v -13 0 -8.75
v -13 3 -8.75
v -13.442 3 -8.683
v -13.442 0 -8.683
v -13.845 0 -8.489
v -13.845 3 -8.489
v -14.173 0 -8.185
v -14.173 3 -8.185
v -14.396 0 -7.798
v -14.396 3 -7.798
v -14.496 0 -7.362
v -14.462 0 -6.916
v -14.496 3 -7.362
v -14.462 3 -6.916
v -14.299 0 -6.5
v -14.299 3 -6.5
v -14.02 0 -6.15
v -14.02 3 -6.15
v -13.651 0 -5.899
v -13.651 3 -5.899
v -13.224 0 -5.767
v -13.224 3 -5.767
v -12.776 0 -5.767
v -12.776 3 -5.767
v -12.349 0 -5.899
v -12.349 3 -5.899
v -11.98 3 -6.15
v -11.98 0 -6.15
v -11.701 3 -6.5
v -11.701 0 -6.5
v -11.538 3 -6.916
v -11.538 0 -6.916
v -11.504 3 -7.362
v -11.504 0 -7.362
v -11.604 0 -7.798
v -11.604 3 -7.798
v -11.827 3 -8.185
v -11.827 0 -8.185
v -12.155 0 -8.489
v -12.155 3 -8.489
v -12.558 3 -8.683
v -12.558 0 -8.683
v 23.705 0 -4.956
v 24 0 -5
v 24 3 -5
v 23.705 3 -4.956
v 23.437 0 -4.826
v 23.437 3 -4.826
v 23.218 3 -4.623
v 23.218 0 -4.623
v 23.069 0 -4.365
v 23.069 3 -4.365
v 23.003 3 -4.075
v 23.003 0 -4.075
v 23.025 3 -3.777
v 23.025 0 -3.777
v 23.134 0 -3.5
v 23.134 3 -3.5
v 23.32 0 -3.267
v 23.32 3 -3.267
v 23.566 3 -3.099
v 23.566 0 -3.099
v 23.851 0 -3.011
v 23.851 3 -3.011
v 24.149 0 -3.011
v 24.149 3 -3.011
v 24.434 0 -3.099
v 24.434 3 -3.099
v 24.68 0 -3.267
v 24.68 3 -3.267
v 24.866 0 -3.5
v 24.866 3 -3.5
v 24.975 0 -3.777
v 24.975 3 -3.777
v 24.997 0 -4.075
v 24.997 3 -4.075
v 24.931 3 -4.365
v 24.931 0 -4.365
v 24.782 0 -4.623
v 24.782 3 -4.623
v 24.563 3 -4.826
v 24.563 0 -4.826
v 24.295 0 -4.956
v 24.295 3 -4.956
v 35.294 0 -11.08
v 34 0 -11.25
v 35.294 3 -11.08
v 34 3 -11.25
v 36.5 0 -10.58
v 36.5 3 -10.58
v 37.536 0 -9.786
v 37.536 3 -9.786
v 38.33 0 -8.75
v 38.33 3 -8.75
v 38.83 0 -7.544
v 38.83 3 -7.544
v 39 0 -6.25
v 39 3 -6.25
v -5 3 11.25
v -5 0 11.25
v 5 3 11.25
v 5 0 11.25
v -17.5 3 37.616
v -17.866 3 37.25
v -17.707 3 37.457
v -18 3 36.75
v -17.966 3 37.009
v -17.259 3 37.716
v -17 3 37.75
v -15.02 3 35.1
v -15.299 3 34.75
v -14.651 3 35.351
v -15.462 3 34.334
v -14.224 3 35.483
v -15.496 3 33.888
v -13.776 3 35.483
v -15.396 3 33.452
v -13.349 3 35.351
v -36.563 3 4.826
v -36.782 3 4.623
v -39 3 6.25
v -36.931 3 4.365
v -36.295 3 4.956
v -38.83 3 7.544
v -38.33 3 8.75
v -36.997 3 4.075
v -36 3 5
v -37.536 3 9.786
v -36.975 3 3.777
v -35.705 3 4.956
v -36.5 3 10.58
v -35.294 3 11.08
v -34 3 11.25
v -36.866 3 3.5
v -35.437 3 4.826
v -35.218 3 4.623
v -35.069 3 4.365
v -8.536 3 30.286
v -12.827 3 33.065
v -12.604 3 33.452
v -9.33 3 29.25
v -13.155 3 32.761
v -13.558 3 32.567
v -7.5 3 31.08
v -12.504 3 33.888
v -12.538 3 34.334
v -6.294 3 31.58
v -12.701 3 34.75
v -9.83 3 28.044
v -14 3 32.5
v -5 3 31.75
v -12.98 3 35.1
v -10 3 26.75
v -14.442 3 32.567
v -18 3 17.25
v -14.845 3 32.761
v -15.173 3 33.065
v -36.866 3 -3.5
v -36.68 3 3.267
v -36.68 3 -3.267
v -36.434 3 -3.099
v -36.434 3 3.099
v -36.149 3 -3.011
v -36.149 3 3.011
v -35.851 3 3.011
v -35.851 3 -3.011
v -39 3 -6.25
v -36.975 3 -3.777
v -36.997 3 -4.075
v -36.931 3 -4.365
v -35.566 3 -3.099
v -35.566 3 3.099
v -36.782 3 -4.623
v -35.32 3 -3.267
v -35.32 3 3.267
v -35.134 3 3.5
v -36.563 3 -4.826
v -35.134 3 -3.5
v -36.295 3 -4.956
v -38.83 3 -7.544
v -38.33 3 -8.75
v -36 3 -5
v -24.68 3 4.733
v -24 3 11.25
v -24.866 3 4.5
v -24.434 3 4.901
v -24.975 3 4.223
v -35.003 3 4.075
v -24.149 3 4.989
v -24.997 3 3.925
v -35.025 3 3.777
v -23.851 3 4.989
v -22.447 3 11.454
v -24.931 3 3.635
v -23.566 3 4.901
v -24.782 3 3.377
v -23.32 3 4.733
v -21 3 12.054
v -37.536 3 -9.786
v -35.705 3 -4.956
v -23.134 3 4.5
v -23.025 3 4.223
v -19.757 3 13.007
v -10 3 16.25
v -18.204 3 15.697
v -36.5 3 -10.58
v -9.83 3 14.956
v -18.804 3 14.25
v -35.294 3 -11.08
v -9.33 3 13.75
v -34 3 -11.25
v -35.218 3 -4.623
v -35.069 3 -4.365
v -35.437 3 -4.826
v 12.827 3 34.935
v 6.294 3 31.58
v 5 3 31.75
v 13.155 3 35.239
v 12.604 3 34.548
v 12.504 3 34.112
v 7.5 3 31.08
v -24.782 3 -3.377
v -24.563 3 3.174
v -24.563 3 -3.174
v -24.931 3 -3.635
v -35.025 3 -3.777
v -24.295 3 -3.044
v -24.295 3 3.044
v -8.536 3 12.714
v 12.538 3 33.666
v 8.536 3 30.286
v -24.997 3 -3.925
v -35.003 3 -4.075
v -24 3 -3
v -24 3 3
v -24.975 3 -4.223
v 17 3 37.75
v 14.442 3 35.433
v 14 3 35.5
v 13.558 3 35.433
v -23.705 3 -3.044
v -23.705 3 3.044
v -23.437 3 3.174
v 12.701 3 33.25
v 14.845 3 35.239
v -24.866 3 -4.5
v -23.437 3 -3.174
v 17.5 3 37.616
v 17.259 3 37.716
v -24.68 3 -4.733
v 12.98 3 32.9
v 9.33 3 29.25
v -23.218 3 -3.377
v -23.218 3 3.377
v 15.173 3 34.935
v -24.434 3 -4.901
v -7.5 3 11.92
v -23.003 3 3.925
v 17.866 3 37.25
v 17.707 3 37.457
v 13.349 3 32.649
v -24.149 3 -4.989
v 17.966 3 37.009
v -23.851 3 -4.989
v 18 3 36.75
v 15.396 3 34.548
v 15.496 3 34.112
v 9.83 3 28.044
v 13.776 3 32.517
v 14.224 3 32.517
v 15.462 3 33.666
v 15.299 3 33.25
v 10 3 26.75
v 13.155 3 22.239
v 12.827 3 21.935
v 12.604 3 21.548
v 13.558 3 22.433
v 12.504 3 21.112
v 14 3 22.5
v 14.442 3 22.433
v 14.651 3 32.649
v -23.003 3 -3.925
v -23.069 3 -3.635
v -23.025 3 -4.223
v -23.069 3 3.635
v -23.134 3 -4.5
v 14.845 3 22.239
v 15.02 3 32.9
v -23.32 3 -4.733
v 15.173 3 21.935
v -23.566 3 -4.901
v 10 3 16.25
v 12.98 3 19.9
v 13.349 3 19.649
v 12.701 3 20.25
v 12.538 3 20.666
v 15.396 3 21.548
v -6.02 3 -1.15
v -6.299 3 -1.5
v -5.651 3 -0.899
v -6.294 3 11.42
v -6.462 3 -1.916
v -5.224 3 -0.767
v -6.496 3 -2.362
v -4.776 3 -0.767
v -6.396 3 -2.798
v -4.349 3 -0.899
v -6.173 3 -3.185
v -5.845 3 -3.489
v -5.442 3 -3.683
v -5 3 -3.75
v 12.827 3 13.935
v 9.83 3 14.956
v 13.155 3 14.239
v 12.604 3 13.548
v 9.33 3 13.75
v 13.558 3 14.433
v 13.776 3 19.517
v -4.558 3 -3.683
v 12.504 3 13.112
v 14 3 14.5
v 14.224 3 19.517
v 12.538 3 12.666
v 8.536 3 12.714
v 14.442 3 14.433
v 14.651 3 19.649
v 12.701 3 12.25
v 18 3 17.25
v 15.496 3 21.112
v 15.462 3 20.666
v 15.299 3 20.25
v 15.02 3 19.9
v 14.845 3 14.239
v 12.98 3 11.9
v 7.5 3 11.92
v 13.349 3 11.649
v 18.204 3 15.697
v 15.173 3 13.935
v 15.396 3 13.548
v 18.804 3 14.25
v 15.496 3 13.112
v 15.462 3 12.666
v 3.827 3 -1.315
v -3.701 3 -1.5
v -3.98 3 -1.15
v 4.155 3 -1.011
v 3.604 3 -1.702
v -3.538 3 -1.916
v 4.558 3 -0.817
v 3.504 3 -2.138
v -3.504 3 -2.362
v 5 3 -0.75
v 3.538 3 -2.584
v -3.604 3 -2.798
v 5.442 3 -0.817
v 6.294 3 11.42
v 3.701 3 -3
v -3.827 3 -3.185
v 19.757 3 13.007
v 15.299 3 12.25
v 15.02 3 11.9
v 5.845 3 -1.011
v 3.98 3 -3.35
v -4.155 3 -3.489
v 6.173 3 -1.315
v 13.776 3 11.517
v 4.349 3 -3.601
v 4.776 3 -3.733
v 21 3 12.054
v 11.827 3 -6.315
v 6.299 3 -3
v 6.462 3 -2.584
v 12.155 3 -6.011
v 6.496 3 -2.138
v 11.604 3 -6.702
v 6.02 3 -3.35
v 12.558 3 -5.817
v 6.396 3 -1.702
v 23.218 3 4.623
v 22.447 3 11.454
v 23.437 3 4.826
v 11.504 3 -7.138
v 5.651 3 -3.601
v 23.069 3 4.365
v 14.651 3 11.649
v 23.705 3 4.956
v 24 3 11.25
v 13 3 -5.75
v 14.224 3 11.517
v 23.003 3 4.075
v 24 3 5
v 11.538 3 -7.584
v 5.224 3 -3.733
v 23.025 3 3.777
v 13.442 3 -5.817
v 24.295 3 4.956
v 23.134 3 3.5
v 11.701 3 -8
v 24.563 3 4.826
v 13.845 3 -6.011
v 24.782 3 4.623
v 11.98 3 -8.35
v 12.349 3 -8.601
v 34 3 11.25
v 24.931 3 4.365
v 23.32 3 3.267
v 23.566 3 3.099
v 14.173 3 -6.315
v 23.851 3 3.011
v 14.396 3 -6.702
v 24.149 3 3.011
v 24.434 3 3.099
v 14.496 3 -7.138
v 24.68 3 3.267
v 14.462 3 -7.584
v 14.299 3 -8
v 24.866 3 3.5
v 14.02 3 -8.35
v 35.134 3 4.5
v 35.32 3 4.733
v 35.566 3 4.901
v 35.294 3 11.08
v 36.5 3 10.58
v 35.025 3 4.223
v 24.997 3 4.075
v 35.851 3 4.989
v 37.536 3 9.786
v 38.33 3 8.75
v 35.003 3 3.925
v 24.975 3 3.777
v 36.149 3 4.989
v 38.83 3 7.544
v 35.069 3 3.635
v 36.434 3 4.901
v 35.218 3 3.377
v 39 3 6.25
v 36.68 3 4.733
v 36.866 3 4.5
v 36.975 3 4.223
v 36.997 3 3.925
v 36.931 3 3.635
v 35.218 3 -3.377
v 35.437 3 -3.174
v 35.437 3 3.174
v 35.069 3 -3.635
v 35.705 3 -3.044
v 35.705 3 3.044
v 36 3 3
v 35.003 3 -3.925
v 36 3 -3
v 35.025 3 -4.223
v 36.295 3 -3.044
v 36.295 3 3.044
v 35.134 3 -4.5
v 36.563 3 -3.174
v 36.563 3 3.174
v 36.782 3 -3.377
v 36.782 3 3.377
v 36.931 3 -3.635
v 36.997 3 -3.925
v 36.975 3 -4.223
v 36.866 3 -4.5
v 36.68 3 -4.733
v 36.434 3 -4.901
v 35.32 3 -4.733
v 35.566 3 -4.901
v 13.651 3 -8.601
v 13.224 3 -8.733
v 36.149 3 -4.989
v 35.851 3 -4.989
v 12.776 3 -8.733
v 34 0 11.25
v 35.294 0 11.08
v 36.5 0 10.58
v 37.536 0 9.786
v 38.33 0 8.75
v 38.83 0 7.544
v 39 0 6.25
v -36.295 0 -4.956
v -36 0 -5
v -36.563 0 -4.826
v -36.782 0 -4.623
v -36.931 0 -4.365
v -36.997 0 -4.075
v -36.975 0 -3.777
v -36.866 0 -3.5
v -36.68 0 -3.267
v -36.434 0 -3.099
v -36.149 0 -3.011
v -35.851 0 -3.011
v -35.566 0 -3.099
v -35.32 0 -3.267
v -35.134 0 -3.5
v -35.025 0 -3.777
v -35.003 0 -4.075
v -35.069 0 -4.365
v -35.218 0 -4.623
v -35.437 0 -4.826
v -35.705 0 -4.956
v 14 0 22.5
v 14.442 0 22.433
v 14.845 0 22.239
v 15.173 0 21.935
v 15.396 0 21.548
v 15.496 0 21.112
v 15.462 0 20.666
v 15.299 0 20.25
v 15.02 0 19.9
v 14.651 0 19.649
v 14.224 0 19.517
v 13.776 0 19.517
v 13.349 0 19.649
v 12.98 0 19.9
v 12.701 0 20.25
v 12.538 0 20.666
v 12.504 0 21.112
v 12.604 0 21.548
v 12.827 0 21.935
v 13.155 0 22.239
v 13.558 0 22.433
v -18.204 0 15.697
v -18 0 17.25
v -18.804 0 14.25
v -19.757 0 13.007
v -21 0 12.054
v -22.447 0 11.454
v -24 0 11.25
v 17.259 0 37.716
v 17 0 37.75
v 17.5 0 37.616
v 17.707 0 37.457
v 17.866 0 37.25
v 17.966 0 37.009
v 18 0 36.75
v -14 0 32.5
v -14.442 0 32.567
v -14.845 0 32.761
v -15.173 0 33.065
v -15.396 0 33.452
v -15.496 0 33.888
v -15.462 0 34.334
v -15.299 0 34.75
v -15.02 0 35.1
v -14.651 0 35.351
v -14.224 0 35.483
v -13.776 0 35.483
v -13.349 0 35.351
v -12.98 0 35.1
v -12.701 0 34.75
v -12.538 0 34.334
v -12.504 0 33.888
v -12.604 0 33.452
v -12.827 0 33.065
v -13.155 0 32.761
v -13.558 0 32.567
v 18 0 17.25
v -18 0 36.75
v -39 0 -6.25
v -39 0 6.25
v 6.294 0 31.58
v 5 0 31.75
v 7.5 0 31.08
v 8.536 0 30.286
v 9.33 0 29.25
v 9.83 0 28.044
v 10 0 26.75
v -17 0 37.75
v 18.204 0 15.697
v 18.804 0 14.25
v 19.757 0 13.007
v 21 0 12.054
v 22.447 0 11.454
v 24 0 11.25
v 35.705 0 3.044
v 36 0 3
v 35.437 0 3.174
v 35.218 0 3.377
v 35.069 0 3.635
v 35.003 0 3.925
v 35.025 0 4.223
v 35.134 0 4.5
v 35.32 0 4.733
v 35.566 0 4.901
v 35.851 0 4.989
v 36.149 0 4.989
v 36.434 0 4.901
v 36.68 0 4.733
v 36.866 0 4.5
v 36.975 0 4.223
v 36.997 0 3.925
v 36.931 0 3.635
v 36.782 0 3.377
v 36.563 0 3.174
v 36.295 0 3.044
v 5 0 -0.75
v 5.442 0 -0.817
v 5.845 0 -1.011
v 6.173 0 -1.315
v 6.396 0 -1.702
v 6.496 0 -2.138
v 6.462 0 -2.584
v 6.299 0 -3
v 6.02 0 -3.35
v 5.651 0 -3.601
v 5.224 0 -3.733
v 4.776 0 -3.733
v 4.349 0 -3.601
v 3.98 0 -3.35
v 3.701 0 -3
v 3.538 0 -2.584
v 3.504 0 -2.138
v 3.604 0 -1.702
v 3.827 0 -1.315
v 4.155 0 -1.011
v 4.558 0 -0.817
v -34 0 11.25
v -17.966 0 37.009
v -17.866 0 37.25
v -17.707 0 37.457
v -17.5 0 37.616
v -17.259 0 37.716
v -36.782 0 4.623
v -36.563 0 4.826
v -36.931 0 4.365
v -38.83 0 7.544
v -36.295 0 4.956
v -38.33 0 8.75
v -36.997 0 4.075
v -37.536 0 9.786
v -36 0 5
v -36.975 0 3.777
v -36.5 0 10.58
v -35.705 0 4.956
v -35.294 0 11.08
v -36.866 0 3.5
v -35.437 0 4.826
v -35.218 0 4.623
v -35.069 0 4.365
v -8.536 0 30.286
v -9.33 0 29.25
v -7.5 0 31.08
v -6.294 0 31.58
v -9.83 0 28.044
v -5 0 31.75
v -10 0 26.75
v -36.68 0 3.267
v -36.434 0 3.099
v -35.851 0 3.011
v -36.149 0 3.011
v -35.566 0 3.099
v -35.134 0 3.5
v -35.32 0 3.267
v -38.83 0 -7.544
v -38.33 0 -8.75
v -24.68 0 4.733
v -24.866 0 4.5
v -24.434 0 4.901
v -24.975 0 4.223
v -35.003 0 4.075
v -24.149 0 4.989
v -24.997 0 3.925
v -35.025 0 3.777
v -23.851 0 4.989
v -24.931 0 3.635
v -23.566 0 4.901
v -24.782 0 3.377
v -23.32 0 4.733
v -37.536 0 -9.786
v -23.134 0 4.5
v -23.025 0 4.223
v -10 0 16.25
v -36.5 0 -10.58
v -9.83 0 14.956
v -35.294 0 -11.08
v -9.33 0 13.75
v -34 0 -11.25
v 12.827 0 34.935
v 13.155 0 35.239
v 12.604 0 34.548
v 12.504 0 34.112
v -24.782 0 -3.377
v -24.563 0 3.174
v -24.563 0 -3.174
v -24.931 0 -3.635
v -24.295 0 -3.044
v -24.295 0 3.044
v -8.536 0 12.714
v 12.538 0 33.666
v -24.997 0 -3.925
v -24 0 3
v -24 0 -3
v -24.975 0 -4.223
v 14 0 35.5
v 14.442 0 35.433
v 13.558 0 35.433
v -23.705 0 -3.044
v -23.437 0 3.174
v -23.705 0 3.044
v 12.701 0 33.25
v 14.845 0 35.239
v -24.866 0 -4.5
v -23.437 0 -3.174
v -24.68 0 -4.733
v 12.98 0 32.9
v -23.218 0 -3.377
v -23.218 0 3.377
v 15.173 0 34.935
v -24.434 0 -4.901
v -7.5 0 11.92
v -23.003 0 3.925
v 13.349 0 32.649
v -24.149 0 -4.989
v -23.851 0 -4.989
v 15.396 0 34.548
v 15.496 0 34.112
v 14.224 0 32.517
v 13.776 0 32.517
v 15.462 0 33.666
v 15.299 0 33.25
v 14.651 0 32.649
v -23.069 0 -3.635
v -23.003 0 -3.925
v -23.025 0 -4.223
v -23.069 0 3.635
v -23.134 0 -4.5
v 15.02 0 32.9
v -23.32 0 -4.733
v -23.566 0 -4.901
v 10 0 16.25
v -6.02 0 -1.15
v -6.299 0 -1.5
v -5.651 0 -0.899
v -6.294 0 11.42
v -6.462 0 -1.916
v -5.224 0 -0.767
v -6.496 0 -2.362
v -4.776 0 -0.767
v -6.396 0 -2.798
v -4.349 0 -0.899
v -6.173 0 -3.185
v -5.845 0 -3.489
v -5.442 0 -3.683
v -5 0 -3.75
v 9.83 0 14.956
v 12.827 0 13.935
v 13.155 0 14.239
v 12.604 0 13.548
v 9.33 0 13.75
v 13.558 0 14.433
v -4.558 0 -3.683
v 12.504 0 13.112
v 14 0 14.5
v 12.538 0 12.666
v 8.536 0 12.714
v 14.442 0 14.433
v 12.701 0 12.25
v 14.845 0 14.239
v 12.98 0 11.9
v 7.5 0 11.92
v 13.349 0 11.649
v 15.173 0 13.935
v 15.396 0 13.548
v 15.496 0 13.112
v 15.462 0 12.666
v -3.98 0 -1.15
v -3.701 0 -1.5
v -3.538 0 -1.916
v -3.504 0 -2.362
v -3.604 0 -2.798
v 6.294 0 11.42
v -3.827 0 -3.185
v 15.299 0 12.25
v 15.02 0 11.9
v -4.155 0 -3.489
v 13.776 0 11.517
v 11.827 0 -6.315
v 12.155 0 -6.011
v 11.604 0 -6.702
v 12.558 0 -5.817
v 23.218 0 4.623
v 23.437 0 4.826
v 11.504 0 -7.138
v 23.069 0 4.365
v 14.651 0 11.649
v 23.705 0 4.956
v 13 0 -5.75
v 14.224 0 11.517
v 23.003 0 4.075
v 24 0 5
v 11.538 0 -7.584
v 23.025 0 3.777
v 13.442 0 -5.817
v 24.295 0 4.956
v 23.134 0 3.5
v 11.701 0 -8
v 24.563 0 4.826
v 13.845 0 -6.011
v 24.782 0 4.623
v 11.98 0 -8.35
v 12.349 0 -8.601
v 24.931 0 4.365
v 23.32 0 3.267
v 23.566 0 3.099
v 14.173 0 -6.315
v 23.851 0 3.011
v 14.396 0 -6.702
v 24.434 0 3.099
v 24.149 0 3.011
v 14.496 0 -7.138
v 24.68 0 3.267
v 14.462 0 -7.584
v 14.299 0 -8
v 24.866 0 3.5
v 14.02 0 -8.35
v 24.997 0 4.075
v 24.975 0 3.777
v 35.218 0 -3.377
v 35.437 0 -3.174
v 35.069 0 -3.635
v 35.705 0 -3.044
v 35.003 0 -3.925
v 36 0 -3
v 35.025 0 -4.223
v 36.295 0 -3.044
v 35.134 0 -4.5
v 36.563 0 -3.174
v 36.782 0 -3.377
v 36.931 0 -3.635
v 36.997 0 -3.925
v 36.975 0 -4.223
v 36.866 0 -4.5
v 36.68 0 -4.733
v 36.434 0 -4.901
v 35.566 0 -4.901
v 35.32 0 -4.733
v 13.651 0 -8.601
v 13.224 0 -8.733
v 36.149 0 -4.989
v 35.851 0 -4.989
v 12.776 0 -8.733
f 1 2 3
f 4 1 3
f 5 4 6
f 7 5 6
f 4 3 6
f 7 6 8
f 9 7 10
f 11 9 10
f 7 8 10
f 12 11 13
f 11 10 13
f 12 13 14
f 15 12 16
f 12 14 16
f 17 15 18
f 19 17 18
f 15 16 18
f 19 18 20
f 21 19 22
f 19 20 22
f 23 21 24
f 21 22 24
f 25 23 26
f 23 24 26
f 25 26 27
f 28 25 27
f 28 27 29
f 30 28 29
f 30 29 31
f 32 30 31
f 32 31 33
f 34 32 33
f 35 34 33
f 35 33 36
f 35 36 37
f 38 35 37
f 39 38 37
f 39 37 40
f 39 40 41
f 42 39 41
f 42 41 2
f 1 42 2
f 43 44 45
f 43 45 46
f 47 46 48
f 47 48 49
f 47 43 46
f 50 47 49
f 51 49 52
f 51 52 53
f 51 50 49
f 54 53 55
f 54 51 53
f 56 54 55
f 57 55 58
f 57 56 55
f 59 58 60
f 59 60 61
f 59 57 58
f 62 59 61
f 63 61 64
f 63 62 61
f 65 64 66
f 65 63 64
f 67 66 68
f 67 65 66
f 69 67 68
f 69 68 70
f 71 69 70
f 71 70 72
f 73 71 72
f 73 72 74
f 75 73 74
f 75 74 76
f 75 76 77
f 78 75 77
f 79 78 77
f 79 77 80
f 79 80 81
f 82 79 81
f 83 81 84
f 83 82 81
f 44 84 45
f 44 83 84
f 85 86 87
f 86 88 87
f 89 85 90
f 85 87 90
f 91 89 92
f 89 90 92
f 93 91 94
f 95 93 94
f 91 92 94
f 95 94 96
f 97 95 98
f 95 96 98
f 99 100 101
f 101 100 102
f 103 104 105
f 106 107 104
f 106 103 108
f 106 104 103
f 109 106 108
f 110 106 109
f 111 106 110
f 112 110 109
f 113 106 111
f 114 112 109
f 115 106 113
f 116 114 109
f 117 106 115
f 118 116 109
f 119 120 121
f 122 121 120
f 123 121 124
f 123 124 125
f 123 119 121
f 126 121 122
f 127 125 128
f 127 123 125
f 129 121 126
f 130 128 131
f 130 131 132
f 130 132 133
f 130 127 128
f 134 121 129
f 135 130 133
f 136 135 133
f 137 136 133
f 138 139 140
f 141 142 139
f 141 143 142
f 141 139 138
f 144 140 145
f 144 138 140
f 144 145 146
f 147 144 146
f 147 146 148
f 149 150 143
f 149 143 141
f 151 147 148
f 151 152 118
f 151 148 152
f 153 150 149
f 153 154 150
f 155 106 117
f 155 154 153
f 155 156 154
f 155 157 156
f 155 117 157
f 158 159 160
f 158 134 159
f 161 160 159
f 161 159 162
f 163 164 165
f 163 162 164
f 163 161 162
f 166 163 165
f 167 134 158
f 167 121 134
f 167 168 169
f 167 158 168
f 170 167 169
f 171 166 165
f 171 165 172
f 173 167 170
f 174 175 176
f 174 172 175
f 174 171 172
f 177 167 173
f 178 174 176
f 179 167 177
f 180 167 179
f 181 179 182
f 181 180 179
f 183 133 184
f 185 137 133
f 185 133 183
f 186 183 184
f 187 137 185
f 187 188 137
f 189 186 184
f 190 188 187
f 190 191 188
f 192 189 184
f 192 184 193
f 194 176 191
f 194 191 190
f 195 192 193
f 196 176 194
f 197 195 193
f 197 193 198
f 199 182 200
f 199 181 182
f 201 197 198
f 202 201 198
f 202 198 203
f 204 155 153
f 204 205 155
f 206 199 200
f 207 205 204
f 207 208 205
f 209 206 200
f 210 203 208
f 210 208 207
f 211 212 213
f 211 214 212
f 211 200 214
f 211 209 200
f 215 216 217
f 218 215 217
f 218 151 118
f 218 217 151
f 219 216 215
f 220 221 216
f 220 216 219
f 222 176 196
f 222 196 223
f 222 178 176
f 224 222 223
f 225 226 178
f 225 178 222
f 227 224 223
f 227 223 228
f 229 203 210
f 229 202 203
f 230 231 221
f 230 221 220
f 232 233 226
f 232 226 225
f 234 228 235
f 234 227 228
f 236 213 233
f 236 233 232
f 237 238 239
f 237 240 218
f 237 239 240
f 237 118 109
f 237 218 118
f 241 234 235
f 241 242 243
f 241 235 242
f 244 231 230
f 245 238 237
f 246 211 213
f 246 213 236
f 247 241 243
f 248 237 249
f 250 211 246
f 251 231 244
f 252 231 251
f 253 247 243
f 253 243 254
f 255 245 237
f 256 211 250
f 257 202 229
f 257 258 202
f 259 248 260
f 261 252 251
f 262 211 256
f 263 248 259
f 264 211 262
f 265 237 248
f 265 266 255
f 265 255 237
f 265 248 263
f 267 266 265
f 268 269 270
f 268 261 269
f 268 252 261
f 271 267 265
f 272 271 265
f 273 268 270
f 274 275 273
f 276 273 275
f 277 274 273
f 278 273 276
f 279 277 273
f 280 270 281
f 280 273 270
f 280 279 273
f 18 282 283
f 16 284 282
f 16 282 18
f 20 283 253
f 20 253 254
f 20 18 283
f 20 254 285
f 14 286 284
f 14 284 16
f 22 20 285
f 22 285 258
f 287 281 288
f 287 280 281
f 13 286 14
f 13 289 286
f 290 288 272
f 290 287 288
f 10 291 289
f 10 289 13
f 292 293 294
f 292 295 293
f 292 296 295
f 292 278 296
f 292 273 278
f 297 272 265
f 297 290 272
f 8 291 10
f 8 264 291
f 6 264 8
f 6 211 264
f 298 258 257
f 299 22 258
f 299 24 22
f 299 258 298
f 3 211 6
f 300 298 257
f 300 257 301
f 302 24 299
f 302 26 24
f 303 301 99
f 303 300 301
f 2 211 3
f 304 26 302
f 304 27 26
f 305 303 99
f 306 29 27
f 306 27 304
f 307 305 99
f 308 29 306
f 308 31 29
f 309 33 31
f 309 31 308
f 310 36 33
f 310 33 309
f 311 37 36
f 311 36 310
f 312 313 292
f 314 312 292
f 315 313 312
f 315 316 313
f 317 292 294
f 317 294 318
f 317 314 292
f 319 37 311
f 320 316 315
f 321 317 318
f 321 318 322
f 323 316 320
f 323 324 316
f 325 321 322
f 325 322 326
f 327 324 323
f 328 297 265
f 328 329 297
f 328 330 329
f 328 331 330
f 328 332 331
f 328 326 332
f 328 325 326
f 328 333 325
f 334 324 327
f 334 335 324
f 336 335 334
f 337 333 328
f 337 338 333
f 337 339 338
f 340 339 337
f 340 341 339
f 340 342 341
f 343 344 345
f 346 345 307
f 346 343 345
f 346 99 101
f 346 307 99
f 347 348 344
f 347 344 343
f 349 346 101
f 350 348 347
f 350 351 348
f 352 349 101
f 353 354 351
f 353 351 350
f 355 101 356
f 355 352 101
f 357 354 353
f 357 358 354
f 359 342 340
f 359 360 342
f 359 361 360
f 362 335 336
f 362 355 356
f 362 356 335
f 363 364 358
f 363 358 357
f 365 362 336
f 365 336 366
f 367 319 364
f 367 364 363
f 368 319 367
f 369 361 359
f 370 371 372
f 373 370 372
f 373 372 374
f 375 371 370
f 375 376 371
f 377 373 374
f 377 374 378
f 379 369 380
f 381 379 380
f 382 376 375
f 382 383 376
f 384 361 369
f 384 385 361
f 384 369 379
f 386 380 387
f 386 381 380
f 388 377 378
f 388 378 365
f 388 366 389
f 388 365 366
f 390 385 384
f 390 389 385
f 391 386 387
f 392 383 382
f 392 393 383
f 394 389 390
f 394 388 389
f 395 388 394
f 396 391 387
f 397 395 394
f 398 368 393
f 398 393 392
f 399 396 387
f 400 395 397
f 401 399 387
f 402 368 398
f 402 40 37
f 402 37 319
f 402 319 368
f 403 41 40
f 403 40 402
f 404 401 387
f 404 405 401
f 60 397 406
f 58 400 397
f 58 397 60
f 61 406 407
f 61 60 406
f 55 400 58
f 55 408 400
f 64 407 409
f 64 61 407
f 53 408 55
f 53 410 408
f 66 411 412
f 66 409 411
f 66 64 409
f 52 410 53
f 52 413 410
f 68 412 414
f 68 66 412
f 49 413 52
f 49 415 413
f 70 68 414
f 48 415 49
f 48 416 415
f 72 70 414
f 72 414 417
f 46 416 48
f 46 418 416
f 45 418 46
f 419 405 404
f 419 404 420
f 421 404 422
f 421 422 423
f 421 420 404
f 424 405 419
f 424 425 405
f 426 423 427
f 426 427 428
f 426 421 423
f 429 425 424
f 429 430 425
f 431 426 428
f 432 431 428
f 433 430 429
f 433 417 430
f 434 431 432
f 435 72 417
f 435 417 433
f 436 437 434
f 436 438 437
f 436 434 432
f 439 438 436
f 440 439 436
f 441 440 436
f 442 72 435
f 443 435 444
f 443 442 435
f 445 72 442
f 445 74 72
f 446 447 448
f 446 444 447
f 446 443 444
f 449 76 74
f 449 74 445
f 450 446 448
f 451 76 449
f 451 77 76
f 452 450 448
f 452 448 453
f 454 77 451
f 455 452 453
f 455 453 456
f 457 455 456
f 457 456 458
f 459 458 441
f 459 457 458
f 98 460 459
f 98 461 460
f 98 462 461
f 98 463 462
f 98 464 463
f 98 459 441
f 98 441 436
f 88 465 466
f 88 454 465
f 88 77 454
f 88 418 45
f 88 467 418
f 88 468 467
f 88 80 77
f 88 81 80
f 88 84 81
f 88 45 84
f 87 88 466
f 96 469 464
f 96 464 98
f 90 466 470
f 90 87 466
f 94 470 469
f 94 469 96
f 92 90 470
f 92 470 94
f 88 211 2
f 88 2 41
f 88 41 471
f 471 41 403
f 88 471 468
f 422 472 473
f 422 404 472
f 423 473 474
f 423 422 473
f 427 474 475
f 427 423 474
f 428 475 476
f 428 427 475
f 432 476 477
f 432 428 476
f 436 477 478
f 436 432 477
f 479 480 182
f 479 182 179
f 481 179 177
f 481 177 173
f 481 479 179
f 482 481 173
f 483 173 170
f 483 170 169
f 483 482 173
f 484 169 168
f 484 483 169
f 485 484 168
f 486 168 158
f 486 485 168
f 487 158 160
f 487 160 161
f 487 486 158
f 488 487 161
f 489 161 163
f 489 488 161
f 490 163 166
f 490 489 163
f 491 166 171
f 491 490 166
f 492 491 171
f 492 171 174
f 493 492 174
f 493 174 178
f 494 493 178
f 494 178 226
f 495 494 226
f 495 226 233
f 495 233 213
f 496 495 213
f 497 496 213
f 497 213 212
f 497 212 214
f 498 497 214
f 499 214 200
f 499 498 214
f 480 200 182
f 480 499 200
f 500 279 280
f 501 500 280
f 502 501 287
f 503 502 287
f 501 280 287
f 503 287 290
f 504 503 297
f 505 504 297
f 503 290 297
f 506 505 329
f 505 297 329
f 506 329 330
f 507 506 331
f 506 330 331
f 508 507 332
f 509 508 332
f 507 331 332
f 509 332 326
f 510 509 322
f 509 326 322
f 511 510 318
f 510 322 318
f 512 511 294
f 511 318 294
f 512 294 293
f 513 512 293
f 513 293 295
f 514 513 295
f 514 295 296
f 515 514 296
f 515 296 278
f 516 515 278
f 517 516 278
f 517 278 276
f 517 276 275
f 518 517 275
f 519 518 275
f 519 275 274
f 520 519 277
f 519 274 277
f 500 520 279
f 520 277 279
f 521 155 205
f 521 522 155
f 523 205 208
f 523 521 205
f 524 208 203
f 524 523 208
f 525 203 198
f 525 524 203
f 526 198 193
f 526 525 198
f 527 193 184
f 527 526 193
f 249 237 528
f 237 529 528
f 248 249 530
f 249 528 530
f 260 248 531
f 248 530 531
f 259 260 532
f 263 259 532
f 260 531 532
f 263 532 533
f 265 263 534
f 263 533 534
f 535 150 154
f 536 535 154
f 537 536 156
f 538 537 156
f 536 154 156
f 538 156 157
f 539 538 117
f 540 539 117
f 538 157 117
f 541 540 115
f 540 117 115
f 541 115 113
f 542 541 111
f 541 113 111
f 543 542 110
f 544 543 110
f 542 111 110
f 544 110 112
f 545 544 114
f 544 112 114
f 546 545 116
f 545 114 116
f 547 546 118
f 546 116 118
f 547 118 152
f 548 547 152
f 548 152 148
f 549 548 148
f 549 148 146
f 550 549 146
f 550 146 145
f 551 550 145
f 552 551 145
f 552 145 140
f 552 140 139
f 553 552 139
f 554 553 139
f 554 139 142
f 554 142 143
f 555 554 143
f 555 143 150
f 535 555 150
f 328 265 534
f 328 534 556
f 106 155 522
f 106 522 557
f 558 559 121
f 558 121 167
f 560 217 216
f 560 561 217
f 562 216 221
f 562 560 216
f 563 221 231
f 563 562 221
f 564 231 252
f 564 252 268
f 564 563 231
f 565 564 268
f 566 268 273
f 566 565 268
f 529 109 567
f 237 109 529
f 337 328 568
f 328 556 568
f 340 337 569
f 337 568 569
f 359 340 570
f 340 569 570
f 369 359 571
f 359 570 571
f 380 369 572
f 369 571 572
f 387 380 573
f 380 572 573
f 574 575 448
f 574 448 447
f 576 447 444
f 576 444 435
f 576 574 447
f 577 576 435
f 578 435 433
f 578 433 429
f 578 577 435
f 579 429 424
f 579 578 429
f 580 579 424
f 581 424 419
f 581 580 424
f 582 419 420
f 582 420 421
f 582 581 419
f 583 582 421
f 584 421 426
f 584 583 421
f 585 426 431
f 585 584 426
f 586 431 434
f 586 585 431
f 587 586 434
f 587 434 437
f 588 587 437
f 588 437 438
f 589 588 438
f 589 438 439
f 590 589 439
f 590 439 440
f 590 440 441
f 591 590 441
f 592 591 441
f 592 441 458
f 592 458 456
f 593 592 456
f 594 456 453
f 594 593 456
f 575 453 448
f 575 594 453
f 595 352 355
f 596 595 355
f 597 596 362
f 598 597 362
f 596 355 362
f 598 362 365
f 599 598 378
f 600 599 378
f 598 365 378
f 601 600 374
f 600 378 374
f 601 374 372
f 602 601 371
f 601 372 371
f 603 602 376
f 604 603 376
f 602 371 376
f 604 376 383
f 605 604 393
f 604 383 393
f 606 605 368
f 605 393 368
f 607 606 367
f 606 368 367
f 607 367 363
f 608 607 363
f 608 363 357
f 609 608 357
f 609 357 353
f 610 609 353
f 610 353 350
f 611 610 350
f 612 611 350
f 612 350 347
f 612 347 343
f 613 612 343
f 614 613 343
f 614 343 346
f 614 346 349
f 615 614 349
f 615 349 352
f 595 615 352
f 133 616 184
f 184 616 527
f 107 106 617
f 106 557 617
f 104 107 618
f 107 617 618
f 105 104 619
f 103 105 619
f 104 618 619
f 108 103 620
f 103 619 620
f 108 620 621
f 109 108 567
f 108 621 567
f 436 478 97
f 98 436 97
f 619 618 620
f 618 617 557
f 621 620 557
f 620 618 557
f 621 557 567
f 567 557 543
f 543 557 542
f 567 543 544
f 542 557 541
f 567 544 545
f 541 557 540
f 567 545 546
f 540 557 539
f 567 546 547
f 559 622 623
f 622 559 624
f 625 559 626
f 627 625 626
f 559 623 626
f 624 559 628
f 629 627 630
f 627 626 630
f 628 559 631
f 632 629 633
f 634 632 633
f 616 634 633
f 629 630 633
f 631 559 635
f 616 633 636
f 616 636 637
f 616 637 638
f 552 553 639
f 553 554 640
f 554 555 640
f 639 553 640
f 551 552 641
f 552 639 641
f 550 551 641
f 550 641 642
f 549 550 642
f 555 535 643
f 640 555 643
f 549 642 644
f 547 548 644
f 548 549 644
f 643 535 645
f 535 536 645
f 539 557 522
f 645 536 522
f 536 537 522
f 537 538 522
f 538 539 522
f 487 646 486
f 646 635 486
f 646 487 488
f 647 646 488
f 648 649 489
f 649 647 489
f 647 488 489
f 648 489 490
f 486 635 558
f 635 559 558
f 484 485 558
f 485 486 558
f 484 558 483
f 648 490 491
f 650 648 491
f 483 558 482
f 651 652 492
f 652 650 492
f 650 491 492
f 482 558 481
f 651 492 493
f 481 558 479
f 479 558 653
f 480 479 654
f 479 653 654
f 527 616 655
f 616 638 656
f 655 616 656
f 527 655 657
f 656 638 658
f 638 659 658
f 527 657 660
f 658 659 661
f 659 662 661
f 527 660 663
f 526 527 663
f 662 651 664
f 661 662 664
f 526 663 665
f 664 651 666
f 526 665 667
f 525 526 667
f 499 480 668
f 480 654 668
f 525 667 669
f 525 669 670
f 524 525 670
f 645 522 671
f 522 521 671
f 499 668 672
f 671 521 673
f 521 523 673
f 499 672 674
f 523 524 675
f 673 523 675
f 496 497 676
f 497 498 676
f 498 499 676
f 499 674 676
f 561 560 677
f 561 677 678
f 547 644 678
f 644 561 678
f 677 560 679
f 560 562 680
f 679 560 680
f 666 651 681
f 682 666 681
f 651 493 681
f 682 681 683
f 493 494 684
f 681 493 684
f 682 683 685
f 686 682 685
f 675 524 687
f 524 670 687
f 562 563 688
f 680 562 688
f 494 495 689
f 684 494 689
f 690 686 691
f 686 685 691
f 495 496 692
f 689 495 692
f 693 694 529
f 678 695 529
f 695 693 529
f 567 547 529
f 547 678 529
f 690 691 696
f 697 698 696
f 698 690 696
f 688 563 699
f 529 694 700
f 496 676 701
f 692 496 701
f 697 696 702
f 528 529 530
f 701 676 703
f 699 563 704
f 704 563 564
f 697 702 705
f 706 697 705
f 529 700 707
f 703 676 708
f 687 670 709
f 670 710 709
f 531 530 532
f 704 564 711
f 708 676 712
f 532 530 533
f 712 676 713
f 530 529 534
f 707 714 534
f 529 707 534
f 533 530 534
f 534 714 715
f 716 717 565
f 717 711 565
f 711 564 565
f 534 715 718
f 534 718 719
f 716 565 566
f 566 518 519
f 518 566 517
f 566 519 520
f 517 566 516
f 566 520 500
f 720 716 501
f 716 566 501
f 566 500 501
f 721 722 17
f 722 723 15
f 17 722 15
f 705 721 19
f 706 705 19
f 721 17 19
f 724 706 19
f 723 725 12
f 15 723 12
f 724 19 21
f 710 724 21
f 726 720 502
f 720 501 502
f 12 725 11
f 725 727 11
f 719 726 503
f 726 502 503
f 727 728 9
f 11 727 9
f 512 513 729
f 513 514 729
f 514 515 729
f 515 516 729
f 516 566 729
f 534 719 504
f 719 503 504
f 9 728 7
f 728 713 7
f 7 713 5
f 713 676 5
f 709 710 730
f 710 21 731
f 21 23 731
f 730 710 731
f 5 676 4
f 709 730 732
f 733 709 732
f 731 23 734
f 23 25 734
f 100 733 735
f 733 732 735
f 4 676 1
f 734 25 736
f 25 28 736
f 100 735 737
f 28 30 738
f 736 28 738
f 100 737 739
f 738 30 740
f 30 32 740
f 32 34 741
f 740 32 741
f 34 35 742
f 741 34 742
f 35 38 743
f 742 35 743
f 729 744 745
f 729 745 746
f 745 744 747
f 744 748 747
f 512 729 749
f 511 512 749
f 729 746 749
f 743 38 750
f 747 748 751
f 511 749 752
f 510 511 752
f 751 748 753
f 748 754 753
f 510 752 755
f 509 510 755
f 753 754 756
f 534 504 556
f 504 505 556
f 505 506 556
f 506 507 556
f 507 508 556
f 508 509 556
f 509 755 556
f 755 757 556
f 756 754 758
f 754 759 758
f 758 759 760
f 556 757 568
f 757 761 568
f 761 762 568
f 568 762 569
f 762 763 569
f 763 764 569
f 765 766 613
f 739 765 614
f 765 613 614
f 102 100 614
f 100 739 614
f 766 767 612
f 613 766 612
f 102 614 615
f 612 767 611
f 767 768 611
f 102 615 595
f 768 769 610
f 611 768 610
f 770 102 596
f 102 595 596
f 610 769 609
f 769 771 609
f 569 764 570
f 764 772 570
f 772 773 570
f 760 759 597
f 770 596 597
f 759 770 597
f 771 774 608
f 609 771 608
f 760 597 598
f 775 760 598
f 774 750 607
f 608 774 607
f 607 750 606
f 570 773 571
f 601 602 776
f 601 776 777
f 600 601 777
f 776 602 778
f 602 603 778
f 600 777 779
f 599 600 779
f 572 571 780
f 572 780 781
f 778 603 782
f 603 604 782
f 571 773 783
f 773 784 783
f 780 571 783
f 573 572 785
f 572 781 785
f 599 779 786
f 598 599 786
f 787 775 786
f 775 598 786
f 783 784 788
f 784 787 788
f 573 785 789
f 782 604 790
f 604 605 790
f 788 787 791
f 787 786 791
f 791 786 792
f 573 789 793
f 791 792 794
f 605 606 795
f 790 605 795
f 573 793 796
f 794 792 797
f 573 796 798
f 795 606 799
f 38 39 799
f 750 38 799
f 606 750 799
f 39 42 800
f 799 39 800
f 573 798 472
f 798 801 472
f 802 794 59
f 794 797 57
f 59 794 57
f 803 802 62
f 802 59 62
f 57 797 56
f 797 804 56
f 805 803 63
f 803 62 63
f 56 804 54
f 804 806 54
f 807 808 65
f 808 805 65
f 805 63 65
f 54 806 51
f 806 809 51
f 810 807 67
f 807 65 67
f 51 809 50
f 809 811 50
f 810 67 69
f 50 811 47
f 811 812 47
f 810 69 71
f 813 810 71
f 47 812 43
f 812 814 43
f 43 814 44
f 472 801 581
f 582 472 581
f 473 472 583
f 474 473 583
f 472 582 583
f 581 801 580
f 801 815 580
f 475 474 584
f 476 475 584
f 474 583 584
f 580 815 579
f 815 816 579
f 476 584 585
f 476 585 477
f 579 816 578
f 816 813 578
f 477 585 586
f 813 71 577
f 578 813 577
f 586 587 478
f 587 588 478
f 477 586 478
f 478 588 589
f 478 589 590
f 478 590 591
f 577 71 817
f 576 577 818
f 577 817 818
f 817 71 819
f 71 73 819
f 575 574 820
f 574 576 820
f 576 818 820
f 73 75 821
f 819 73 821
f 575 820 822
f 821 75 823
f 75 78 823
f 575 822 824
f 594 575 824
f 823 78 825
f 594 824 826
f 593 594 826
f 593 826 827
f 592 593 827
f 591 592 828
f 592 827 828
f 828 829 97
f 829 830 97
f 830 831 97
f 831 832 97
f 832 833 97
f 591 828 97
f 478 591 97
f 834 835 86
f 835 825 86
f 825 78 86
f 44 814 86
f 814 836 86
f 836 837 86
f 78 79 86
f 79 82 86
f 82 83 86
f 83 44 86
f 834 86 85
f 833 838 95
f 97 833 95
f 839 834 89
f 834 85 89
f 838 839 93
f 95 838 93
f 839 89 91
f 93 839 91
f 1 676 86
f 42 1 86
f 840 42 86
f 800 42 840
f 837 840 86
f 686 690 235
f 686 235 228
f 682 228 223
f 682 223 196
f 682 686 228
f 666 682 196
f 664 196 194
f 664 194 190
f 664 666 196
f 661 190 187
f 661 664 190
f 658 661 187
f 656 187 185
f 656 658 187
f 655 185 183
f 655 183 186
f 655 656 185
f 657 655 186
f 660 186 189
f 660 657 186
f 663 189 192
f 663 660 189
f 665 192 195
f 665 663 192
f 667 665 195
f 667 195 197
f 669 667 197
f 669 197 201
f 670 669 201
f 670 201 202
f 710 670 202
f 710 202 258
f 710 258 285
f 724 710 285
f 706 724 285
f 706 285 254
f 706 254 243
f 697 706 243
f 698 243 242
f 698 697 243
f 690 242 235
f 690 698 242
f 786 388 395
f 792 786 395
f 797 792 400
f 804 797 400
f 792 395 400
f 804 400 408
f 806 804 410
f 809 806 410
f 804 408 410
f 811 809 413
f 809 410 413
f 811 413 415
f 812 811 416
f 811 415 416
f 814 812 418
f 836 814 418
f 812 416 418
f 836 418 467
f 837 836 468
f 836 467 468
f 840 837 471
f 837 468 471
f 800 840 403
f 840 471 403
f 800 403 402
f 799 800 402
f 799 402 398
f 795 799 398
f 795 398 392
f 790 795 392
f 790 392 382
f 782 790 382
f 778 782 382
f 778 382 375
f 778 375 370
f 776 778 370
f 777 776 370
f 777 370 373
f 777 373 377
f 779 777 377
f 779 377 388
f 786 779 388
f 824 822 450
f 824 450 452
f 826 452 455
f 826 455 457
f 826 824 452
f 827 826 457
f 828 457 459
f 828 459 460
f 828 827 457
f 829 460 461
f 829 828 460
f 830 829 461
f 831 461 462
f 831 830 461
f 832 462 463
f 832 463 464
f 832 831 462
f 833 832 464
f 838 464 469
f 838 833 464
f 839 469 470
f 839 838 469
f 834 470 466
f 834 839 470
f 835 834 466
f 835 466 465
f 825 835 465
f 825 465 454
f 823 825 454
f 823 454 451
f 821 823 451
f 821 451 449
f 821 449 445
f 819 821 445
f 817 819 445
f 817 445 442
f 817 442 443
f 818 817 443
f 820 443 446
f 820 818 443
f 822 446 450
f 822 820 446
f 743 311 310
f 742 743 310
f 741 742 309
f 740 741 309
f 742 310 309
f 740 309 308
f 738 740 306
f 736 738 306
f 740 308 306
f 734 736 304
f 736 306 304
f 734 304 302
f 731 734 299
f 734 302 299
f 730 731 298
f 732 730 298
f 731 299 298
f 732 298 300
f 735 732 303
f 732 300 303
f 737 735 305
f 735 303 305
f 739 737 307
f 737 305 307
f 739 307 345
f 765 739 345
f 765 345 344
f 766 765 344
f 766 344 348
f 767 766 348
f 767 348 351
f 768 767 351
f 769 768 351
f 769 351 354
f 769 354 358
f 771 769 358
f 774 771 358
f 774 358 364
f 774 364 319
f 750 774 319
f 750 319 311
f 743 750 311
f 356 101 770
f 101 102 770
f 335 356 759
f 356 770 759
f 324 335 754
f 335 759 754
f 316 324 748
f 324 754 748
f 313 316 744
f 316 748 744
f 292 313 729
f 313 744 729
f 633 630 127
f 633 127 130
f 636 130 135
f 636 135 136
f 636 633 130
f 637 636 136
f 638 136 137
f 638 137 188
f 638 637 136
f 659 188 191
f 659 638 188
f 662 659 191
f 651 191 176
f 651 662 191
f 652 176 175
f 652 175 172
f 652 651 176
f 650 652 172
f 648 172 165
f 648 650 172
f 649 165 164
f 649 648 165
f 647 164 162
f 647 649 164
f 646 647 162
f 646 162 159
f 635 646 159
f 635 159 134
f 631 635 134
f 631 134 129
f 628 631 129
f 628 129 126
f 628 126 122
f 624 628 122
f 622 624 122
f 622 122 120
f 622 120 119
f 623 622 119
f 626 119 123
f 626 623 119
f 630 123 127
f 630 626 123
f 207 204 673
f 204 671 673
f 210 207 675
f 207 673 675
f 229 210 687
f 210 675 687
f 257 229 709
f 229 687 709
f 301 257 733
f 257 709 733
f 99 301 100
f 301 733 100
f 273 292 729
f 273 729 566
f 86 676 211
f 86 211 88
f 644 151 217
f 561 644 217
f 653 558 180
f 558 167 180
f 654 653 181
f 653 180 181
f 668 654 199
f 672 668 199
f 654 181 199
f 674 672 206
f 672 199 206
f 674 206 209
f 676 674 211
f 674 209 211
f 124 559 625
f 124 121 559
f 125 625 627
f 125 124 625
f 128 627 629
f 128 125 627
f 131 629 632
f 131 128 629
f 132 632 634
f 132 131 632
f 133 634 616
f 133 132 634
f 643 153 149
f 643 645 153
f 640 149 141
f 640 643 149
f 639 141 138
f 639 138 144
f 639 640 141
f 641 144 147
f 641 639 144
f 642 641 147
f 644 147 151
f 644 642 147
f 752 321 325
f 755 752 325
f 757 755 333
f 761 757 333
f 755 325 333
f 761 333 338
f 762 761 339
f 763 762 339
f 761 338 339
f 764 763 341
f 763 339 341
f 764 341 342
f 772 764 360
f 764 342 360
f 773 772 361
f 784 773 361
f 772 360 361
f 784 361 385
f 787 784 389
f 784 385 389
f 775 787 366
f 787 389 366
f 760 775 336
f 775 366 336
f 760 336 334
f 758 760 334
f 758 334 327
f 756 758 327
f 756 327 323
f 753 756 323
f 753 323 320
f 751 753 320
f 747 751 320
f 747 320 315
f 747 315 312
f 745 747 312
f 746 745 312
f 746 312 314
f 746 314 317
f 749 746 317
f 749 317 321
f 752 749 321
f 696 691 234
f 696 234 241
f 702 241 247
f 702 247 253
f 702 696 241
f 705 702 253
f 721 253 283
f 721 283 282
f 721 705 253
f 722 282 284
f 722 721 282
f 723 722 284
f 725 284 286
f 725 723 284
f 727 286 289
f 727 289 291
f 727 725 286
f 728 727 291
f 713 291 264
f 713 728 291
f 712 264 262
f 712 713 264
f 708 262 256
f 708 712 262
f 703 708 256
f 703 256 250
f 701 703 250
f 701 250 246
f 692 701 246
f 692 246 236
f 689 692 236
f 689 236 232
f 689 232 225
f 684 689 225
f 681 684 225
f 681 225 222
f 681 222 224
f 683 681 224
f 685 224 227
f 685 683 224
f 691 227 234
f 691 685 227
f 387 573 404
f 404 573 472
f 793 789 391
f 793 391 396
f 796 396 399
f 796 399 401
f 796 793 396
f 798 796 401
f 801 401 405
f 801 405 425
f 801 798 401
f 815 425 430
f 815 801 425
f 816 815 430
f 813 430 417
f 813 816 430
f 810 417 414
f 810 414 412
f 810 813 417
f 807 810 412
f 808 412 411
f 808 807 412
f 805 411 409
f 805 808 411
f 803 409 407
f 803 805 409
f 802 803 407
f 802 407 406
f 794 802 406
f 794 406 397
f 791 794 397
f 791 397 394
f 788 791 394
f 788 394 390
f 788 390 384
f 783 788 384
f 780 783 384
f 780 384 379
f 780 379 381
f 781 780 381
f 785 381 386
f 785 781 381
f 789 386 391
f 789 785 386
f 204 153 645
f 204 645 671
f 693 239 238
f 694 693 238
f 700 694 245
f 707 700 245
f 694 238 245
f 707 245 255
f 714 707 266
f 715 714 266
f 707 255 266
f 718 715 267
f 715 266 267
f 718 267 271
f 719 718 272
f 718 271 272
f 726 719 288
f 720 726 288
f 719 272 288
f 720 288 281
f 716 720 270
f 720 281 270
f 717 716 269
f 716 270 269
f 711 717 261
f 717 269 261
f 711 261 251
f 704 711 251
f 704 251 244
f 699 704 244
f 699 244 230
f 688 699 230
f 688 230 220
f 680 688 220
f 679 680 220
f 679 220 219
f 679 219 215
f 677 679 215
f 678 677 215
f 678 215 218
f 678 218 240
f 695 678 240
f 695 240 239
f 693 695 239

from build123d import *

# Parameters (mm, degrees)
SKETCH_1_W          = 78
SKETCH_1_H          = 22.5
SKETCH_1_R          = 1
EXTRUDE_1_DEPTH     = 3
FILLET_1_R          = 5
SKETCH_2_R          = 1.5
SKETCH_2_W          = 20
SKETCH_2_H          = 6
EXTRUDE_2_DEPTH     = 3
SKETCH_4_R          = 1.5
CUT_EXTRUDE_1_DEPTH = 29.5
SKETCH_6_R          = 1.5
CUT_EXTRUDE_3_DEPTH = 39
FILLET_7_R          = 6
SKETCH_7_R          = 1.5
CUT_EXTRUDE_4_DEPTH = 10
FILLET_9_R          = 1
FILLET_10_R         = 5


with BuildPart() as part:
    # 草图1 → 凸台-拉伸1 (new body)
    with BuildSketch(Plane(origin=(0, 0, 0), x_dir=(1, 0, 0), z_dir=(0, 1, 0))):
        Rectangle(SKETCH_1_W, SKETCH_1_H)
        with Locations(Location((36, 4, 0), (0, 0, 270))):
            Circle(SKETCH_1_R, mode=Mode.SUBTRACT)
        with Locations(Location((24, 4, 0), (0, 0, 90))):
            Circle(SKETCH_1_R, mode=Mode.SUBTRACT)
        with Locations(Location((36, -4, 0), (0, 0, 90))):
            Circle(SKETCH_1_R, mode=Mode.SUBTRACT)
        with Locations(Location((24, -4, 0), (0, 0, 270))):
            Circle(SKETCH_1_R, mode=Mode.SUBTRACT)
        with Locations(Location((-24, -4, 0), (0, 0, 90))):
            Circle(SKETCH_1_R, mode=Mode.SUBTRACT)
        with Locations(Location((-36, -4, 0), (0, 0, 270))):
            Circle(SKETCH_1_R, mode=Mode.SUBTRACT)
        with Locations(Location((-24, 4, 0), (0, 0, 270))):
            Circle(SKETCH_1_R, mode=Mode.SUBTRACT)
        with Locations(Location((-36, 4, 0), (0, 0, 90))):
            Circle(SKETCH_1_R, mode=Mode.SUBTRACT)
    extrude(amount=EXTRUDE_1_DEPTH)

    # 圆角1
    fillet_1_edges = [part.edges().sort_by_distance(p)[0] for p in [
        (39, 1.5, 11.25),
        (-39, 1.5, 11.25),
        (-39, 1.5, -11.25),
        (39, 1.5, -11.25),
    ]]
    fillet(fillet_1_edges, radius=FILLET_1_R)

    # 草图2 → 凸台-拉伸2 (add)
    # profile 1 of 4: a face of its own
    with BuildSketch(Plane(origin=(0, 3, 0), x_dir=(1, 0, 0), z_dir=(0, 1, 0))):
        Polygon((-10, -31.75), (-10, -11.25), (-18, -11.25), (-18, -37.75), (-10, -37.75), align=None)
        with Locations((-14, -21)):
            Circle(SKETCH_2_R, mode=Mode.SUBTRACT)
    # profile 2 of 4: a face of its own
    with BuildSketch(Plane(origin=(0, 3, 0), x_dir=(1, 0, 0), z_dir=(0, 1, 0))):
        with Locations((-14, -21)):
            Circle(SKETCH_2_R)
    # profile 3 of 4: a face of its own
    with BuildSketch(Plane(origin=(0, 3, 0), x_dir=(1, 0, 0), z_dir=(0, 1, 0))):
        Polygon((18, -11.25), (10, -11.25), (10, -31.75), (10, -37.75), (18, -37.75), align=None)
        with Locations(Location((14, -21, 0), (0, 0, 270))):
            Circle(SKETCH_2_R, mode=Mode.SUBTRACT)
    # profile 4 of 4: a face of its own
    with BuildSketch(Plane(origin=(0, 3, 0), x_dir=(1, 0, 0), z_dir=(0, 1, 0))):
        with Locations((0, -34.75)):
            Rectangle(SKETCH_2_W, SKETCH_2_H)
    extrude(amount=-EXTRUDE_2_DEPTH)

    # 草图4 → 切除-拉伸1 (cut)
    with BuildSketch(Plane(origin=(0, 3, 0), x_dir=(1, 0, 0), z_dir=(0, 1, 0))):
        with Locations(Location((13, 7.25, 0), (0, 0, 270))):
            Circle(SKETCH_4_R)
        with Locations(Location((-13, 7.25, 0), (0, 0, 90))):
            Circle(SKETCH_4_R)
        with Locations(Location((5, 2.25, 0), (0, 0, 270))):
            Circle(SKETCH_4_R)
        with Locations(Location((-5, 2.25, 0), (0, 0, 90))):
            Circle(SKETCH_4_R)
    extrude(amount=-CUT_EXTRUDE_1_DEPTH, mode=Mode.SUBTRACT)

    # 草图6 → 切除-拉伸3 (cut)
    with BuildSketch(Plane(origin=(0, 3, 0), x_dir=(1, 0, 0), z_dir=(0, 1, 0))):
        with Locations(Location((14, -13, 0), (0, 0, 270))):
            Circle(SKETCH_6_R)
    extrude(amount=-CUT_EXTRUDE_3_DEPTH, mode=Mode.SUBTRACT)

    # 圆角7
    fillet_7_edges = [part.edges().sort_by_distance(p)[0] for p in [
        (-18, 1.5, 11.25),
        (18, 1.5, 11.25),
    ]]
    fillet(fillet_7_edges, radius=FILLET_7_R)

    # 草图7 → 切除-拉伸4 (cut)
    with BuildSketch(Plane(origin=(0, 3, 0), x_dir=(1, 0, 0), z_dir=(0, 1, 0))):
        with Locations(Location((14, -34, 0), (0, 0, 270))):
            Circle(SKETCH_7_R)
        with Locations(Location((-14, -34, 0), (0, 0, 90))):
            Circle(SKETCH_7_R)
    extrude(amount=-CUT_EXTRUDE_4_DEPTH, mode=Mode.SUBTRACT)

    # 圆角9
    fillet_9_edges = [part.edges().sort_by_distance(p)[0] for p in [
        (18, 1.5, 37.75),
        (-18, 1.5, 37.75),
    ]]
    fillet(fillet_9_edges, radius=FILLET_9_R)

    # 圆角10
    fillet_10_edges = [part.edges().sort_by_distance(p)[0] for p in [
        (-10, 1.5, 11.25),
        (-10, 1.5, 31.75),
        (10, 1.5, 31.75),
        (10, 1.5, 11.25),
    ]]
    fillet(fillet_10_edges, radius=FILLET_10_R)


solid = part.part
